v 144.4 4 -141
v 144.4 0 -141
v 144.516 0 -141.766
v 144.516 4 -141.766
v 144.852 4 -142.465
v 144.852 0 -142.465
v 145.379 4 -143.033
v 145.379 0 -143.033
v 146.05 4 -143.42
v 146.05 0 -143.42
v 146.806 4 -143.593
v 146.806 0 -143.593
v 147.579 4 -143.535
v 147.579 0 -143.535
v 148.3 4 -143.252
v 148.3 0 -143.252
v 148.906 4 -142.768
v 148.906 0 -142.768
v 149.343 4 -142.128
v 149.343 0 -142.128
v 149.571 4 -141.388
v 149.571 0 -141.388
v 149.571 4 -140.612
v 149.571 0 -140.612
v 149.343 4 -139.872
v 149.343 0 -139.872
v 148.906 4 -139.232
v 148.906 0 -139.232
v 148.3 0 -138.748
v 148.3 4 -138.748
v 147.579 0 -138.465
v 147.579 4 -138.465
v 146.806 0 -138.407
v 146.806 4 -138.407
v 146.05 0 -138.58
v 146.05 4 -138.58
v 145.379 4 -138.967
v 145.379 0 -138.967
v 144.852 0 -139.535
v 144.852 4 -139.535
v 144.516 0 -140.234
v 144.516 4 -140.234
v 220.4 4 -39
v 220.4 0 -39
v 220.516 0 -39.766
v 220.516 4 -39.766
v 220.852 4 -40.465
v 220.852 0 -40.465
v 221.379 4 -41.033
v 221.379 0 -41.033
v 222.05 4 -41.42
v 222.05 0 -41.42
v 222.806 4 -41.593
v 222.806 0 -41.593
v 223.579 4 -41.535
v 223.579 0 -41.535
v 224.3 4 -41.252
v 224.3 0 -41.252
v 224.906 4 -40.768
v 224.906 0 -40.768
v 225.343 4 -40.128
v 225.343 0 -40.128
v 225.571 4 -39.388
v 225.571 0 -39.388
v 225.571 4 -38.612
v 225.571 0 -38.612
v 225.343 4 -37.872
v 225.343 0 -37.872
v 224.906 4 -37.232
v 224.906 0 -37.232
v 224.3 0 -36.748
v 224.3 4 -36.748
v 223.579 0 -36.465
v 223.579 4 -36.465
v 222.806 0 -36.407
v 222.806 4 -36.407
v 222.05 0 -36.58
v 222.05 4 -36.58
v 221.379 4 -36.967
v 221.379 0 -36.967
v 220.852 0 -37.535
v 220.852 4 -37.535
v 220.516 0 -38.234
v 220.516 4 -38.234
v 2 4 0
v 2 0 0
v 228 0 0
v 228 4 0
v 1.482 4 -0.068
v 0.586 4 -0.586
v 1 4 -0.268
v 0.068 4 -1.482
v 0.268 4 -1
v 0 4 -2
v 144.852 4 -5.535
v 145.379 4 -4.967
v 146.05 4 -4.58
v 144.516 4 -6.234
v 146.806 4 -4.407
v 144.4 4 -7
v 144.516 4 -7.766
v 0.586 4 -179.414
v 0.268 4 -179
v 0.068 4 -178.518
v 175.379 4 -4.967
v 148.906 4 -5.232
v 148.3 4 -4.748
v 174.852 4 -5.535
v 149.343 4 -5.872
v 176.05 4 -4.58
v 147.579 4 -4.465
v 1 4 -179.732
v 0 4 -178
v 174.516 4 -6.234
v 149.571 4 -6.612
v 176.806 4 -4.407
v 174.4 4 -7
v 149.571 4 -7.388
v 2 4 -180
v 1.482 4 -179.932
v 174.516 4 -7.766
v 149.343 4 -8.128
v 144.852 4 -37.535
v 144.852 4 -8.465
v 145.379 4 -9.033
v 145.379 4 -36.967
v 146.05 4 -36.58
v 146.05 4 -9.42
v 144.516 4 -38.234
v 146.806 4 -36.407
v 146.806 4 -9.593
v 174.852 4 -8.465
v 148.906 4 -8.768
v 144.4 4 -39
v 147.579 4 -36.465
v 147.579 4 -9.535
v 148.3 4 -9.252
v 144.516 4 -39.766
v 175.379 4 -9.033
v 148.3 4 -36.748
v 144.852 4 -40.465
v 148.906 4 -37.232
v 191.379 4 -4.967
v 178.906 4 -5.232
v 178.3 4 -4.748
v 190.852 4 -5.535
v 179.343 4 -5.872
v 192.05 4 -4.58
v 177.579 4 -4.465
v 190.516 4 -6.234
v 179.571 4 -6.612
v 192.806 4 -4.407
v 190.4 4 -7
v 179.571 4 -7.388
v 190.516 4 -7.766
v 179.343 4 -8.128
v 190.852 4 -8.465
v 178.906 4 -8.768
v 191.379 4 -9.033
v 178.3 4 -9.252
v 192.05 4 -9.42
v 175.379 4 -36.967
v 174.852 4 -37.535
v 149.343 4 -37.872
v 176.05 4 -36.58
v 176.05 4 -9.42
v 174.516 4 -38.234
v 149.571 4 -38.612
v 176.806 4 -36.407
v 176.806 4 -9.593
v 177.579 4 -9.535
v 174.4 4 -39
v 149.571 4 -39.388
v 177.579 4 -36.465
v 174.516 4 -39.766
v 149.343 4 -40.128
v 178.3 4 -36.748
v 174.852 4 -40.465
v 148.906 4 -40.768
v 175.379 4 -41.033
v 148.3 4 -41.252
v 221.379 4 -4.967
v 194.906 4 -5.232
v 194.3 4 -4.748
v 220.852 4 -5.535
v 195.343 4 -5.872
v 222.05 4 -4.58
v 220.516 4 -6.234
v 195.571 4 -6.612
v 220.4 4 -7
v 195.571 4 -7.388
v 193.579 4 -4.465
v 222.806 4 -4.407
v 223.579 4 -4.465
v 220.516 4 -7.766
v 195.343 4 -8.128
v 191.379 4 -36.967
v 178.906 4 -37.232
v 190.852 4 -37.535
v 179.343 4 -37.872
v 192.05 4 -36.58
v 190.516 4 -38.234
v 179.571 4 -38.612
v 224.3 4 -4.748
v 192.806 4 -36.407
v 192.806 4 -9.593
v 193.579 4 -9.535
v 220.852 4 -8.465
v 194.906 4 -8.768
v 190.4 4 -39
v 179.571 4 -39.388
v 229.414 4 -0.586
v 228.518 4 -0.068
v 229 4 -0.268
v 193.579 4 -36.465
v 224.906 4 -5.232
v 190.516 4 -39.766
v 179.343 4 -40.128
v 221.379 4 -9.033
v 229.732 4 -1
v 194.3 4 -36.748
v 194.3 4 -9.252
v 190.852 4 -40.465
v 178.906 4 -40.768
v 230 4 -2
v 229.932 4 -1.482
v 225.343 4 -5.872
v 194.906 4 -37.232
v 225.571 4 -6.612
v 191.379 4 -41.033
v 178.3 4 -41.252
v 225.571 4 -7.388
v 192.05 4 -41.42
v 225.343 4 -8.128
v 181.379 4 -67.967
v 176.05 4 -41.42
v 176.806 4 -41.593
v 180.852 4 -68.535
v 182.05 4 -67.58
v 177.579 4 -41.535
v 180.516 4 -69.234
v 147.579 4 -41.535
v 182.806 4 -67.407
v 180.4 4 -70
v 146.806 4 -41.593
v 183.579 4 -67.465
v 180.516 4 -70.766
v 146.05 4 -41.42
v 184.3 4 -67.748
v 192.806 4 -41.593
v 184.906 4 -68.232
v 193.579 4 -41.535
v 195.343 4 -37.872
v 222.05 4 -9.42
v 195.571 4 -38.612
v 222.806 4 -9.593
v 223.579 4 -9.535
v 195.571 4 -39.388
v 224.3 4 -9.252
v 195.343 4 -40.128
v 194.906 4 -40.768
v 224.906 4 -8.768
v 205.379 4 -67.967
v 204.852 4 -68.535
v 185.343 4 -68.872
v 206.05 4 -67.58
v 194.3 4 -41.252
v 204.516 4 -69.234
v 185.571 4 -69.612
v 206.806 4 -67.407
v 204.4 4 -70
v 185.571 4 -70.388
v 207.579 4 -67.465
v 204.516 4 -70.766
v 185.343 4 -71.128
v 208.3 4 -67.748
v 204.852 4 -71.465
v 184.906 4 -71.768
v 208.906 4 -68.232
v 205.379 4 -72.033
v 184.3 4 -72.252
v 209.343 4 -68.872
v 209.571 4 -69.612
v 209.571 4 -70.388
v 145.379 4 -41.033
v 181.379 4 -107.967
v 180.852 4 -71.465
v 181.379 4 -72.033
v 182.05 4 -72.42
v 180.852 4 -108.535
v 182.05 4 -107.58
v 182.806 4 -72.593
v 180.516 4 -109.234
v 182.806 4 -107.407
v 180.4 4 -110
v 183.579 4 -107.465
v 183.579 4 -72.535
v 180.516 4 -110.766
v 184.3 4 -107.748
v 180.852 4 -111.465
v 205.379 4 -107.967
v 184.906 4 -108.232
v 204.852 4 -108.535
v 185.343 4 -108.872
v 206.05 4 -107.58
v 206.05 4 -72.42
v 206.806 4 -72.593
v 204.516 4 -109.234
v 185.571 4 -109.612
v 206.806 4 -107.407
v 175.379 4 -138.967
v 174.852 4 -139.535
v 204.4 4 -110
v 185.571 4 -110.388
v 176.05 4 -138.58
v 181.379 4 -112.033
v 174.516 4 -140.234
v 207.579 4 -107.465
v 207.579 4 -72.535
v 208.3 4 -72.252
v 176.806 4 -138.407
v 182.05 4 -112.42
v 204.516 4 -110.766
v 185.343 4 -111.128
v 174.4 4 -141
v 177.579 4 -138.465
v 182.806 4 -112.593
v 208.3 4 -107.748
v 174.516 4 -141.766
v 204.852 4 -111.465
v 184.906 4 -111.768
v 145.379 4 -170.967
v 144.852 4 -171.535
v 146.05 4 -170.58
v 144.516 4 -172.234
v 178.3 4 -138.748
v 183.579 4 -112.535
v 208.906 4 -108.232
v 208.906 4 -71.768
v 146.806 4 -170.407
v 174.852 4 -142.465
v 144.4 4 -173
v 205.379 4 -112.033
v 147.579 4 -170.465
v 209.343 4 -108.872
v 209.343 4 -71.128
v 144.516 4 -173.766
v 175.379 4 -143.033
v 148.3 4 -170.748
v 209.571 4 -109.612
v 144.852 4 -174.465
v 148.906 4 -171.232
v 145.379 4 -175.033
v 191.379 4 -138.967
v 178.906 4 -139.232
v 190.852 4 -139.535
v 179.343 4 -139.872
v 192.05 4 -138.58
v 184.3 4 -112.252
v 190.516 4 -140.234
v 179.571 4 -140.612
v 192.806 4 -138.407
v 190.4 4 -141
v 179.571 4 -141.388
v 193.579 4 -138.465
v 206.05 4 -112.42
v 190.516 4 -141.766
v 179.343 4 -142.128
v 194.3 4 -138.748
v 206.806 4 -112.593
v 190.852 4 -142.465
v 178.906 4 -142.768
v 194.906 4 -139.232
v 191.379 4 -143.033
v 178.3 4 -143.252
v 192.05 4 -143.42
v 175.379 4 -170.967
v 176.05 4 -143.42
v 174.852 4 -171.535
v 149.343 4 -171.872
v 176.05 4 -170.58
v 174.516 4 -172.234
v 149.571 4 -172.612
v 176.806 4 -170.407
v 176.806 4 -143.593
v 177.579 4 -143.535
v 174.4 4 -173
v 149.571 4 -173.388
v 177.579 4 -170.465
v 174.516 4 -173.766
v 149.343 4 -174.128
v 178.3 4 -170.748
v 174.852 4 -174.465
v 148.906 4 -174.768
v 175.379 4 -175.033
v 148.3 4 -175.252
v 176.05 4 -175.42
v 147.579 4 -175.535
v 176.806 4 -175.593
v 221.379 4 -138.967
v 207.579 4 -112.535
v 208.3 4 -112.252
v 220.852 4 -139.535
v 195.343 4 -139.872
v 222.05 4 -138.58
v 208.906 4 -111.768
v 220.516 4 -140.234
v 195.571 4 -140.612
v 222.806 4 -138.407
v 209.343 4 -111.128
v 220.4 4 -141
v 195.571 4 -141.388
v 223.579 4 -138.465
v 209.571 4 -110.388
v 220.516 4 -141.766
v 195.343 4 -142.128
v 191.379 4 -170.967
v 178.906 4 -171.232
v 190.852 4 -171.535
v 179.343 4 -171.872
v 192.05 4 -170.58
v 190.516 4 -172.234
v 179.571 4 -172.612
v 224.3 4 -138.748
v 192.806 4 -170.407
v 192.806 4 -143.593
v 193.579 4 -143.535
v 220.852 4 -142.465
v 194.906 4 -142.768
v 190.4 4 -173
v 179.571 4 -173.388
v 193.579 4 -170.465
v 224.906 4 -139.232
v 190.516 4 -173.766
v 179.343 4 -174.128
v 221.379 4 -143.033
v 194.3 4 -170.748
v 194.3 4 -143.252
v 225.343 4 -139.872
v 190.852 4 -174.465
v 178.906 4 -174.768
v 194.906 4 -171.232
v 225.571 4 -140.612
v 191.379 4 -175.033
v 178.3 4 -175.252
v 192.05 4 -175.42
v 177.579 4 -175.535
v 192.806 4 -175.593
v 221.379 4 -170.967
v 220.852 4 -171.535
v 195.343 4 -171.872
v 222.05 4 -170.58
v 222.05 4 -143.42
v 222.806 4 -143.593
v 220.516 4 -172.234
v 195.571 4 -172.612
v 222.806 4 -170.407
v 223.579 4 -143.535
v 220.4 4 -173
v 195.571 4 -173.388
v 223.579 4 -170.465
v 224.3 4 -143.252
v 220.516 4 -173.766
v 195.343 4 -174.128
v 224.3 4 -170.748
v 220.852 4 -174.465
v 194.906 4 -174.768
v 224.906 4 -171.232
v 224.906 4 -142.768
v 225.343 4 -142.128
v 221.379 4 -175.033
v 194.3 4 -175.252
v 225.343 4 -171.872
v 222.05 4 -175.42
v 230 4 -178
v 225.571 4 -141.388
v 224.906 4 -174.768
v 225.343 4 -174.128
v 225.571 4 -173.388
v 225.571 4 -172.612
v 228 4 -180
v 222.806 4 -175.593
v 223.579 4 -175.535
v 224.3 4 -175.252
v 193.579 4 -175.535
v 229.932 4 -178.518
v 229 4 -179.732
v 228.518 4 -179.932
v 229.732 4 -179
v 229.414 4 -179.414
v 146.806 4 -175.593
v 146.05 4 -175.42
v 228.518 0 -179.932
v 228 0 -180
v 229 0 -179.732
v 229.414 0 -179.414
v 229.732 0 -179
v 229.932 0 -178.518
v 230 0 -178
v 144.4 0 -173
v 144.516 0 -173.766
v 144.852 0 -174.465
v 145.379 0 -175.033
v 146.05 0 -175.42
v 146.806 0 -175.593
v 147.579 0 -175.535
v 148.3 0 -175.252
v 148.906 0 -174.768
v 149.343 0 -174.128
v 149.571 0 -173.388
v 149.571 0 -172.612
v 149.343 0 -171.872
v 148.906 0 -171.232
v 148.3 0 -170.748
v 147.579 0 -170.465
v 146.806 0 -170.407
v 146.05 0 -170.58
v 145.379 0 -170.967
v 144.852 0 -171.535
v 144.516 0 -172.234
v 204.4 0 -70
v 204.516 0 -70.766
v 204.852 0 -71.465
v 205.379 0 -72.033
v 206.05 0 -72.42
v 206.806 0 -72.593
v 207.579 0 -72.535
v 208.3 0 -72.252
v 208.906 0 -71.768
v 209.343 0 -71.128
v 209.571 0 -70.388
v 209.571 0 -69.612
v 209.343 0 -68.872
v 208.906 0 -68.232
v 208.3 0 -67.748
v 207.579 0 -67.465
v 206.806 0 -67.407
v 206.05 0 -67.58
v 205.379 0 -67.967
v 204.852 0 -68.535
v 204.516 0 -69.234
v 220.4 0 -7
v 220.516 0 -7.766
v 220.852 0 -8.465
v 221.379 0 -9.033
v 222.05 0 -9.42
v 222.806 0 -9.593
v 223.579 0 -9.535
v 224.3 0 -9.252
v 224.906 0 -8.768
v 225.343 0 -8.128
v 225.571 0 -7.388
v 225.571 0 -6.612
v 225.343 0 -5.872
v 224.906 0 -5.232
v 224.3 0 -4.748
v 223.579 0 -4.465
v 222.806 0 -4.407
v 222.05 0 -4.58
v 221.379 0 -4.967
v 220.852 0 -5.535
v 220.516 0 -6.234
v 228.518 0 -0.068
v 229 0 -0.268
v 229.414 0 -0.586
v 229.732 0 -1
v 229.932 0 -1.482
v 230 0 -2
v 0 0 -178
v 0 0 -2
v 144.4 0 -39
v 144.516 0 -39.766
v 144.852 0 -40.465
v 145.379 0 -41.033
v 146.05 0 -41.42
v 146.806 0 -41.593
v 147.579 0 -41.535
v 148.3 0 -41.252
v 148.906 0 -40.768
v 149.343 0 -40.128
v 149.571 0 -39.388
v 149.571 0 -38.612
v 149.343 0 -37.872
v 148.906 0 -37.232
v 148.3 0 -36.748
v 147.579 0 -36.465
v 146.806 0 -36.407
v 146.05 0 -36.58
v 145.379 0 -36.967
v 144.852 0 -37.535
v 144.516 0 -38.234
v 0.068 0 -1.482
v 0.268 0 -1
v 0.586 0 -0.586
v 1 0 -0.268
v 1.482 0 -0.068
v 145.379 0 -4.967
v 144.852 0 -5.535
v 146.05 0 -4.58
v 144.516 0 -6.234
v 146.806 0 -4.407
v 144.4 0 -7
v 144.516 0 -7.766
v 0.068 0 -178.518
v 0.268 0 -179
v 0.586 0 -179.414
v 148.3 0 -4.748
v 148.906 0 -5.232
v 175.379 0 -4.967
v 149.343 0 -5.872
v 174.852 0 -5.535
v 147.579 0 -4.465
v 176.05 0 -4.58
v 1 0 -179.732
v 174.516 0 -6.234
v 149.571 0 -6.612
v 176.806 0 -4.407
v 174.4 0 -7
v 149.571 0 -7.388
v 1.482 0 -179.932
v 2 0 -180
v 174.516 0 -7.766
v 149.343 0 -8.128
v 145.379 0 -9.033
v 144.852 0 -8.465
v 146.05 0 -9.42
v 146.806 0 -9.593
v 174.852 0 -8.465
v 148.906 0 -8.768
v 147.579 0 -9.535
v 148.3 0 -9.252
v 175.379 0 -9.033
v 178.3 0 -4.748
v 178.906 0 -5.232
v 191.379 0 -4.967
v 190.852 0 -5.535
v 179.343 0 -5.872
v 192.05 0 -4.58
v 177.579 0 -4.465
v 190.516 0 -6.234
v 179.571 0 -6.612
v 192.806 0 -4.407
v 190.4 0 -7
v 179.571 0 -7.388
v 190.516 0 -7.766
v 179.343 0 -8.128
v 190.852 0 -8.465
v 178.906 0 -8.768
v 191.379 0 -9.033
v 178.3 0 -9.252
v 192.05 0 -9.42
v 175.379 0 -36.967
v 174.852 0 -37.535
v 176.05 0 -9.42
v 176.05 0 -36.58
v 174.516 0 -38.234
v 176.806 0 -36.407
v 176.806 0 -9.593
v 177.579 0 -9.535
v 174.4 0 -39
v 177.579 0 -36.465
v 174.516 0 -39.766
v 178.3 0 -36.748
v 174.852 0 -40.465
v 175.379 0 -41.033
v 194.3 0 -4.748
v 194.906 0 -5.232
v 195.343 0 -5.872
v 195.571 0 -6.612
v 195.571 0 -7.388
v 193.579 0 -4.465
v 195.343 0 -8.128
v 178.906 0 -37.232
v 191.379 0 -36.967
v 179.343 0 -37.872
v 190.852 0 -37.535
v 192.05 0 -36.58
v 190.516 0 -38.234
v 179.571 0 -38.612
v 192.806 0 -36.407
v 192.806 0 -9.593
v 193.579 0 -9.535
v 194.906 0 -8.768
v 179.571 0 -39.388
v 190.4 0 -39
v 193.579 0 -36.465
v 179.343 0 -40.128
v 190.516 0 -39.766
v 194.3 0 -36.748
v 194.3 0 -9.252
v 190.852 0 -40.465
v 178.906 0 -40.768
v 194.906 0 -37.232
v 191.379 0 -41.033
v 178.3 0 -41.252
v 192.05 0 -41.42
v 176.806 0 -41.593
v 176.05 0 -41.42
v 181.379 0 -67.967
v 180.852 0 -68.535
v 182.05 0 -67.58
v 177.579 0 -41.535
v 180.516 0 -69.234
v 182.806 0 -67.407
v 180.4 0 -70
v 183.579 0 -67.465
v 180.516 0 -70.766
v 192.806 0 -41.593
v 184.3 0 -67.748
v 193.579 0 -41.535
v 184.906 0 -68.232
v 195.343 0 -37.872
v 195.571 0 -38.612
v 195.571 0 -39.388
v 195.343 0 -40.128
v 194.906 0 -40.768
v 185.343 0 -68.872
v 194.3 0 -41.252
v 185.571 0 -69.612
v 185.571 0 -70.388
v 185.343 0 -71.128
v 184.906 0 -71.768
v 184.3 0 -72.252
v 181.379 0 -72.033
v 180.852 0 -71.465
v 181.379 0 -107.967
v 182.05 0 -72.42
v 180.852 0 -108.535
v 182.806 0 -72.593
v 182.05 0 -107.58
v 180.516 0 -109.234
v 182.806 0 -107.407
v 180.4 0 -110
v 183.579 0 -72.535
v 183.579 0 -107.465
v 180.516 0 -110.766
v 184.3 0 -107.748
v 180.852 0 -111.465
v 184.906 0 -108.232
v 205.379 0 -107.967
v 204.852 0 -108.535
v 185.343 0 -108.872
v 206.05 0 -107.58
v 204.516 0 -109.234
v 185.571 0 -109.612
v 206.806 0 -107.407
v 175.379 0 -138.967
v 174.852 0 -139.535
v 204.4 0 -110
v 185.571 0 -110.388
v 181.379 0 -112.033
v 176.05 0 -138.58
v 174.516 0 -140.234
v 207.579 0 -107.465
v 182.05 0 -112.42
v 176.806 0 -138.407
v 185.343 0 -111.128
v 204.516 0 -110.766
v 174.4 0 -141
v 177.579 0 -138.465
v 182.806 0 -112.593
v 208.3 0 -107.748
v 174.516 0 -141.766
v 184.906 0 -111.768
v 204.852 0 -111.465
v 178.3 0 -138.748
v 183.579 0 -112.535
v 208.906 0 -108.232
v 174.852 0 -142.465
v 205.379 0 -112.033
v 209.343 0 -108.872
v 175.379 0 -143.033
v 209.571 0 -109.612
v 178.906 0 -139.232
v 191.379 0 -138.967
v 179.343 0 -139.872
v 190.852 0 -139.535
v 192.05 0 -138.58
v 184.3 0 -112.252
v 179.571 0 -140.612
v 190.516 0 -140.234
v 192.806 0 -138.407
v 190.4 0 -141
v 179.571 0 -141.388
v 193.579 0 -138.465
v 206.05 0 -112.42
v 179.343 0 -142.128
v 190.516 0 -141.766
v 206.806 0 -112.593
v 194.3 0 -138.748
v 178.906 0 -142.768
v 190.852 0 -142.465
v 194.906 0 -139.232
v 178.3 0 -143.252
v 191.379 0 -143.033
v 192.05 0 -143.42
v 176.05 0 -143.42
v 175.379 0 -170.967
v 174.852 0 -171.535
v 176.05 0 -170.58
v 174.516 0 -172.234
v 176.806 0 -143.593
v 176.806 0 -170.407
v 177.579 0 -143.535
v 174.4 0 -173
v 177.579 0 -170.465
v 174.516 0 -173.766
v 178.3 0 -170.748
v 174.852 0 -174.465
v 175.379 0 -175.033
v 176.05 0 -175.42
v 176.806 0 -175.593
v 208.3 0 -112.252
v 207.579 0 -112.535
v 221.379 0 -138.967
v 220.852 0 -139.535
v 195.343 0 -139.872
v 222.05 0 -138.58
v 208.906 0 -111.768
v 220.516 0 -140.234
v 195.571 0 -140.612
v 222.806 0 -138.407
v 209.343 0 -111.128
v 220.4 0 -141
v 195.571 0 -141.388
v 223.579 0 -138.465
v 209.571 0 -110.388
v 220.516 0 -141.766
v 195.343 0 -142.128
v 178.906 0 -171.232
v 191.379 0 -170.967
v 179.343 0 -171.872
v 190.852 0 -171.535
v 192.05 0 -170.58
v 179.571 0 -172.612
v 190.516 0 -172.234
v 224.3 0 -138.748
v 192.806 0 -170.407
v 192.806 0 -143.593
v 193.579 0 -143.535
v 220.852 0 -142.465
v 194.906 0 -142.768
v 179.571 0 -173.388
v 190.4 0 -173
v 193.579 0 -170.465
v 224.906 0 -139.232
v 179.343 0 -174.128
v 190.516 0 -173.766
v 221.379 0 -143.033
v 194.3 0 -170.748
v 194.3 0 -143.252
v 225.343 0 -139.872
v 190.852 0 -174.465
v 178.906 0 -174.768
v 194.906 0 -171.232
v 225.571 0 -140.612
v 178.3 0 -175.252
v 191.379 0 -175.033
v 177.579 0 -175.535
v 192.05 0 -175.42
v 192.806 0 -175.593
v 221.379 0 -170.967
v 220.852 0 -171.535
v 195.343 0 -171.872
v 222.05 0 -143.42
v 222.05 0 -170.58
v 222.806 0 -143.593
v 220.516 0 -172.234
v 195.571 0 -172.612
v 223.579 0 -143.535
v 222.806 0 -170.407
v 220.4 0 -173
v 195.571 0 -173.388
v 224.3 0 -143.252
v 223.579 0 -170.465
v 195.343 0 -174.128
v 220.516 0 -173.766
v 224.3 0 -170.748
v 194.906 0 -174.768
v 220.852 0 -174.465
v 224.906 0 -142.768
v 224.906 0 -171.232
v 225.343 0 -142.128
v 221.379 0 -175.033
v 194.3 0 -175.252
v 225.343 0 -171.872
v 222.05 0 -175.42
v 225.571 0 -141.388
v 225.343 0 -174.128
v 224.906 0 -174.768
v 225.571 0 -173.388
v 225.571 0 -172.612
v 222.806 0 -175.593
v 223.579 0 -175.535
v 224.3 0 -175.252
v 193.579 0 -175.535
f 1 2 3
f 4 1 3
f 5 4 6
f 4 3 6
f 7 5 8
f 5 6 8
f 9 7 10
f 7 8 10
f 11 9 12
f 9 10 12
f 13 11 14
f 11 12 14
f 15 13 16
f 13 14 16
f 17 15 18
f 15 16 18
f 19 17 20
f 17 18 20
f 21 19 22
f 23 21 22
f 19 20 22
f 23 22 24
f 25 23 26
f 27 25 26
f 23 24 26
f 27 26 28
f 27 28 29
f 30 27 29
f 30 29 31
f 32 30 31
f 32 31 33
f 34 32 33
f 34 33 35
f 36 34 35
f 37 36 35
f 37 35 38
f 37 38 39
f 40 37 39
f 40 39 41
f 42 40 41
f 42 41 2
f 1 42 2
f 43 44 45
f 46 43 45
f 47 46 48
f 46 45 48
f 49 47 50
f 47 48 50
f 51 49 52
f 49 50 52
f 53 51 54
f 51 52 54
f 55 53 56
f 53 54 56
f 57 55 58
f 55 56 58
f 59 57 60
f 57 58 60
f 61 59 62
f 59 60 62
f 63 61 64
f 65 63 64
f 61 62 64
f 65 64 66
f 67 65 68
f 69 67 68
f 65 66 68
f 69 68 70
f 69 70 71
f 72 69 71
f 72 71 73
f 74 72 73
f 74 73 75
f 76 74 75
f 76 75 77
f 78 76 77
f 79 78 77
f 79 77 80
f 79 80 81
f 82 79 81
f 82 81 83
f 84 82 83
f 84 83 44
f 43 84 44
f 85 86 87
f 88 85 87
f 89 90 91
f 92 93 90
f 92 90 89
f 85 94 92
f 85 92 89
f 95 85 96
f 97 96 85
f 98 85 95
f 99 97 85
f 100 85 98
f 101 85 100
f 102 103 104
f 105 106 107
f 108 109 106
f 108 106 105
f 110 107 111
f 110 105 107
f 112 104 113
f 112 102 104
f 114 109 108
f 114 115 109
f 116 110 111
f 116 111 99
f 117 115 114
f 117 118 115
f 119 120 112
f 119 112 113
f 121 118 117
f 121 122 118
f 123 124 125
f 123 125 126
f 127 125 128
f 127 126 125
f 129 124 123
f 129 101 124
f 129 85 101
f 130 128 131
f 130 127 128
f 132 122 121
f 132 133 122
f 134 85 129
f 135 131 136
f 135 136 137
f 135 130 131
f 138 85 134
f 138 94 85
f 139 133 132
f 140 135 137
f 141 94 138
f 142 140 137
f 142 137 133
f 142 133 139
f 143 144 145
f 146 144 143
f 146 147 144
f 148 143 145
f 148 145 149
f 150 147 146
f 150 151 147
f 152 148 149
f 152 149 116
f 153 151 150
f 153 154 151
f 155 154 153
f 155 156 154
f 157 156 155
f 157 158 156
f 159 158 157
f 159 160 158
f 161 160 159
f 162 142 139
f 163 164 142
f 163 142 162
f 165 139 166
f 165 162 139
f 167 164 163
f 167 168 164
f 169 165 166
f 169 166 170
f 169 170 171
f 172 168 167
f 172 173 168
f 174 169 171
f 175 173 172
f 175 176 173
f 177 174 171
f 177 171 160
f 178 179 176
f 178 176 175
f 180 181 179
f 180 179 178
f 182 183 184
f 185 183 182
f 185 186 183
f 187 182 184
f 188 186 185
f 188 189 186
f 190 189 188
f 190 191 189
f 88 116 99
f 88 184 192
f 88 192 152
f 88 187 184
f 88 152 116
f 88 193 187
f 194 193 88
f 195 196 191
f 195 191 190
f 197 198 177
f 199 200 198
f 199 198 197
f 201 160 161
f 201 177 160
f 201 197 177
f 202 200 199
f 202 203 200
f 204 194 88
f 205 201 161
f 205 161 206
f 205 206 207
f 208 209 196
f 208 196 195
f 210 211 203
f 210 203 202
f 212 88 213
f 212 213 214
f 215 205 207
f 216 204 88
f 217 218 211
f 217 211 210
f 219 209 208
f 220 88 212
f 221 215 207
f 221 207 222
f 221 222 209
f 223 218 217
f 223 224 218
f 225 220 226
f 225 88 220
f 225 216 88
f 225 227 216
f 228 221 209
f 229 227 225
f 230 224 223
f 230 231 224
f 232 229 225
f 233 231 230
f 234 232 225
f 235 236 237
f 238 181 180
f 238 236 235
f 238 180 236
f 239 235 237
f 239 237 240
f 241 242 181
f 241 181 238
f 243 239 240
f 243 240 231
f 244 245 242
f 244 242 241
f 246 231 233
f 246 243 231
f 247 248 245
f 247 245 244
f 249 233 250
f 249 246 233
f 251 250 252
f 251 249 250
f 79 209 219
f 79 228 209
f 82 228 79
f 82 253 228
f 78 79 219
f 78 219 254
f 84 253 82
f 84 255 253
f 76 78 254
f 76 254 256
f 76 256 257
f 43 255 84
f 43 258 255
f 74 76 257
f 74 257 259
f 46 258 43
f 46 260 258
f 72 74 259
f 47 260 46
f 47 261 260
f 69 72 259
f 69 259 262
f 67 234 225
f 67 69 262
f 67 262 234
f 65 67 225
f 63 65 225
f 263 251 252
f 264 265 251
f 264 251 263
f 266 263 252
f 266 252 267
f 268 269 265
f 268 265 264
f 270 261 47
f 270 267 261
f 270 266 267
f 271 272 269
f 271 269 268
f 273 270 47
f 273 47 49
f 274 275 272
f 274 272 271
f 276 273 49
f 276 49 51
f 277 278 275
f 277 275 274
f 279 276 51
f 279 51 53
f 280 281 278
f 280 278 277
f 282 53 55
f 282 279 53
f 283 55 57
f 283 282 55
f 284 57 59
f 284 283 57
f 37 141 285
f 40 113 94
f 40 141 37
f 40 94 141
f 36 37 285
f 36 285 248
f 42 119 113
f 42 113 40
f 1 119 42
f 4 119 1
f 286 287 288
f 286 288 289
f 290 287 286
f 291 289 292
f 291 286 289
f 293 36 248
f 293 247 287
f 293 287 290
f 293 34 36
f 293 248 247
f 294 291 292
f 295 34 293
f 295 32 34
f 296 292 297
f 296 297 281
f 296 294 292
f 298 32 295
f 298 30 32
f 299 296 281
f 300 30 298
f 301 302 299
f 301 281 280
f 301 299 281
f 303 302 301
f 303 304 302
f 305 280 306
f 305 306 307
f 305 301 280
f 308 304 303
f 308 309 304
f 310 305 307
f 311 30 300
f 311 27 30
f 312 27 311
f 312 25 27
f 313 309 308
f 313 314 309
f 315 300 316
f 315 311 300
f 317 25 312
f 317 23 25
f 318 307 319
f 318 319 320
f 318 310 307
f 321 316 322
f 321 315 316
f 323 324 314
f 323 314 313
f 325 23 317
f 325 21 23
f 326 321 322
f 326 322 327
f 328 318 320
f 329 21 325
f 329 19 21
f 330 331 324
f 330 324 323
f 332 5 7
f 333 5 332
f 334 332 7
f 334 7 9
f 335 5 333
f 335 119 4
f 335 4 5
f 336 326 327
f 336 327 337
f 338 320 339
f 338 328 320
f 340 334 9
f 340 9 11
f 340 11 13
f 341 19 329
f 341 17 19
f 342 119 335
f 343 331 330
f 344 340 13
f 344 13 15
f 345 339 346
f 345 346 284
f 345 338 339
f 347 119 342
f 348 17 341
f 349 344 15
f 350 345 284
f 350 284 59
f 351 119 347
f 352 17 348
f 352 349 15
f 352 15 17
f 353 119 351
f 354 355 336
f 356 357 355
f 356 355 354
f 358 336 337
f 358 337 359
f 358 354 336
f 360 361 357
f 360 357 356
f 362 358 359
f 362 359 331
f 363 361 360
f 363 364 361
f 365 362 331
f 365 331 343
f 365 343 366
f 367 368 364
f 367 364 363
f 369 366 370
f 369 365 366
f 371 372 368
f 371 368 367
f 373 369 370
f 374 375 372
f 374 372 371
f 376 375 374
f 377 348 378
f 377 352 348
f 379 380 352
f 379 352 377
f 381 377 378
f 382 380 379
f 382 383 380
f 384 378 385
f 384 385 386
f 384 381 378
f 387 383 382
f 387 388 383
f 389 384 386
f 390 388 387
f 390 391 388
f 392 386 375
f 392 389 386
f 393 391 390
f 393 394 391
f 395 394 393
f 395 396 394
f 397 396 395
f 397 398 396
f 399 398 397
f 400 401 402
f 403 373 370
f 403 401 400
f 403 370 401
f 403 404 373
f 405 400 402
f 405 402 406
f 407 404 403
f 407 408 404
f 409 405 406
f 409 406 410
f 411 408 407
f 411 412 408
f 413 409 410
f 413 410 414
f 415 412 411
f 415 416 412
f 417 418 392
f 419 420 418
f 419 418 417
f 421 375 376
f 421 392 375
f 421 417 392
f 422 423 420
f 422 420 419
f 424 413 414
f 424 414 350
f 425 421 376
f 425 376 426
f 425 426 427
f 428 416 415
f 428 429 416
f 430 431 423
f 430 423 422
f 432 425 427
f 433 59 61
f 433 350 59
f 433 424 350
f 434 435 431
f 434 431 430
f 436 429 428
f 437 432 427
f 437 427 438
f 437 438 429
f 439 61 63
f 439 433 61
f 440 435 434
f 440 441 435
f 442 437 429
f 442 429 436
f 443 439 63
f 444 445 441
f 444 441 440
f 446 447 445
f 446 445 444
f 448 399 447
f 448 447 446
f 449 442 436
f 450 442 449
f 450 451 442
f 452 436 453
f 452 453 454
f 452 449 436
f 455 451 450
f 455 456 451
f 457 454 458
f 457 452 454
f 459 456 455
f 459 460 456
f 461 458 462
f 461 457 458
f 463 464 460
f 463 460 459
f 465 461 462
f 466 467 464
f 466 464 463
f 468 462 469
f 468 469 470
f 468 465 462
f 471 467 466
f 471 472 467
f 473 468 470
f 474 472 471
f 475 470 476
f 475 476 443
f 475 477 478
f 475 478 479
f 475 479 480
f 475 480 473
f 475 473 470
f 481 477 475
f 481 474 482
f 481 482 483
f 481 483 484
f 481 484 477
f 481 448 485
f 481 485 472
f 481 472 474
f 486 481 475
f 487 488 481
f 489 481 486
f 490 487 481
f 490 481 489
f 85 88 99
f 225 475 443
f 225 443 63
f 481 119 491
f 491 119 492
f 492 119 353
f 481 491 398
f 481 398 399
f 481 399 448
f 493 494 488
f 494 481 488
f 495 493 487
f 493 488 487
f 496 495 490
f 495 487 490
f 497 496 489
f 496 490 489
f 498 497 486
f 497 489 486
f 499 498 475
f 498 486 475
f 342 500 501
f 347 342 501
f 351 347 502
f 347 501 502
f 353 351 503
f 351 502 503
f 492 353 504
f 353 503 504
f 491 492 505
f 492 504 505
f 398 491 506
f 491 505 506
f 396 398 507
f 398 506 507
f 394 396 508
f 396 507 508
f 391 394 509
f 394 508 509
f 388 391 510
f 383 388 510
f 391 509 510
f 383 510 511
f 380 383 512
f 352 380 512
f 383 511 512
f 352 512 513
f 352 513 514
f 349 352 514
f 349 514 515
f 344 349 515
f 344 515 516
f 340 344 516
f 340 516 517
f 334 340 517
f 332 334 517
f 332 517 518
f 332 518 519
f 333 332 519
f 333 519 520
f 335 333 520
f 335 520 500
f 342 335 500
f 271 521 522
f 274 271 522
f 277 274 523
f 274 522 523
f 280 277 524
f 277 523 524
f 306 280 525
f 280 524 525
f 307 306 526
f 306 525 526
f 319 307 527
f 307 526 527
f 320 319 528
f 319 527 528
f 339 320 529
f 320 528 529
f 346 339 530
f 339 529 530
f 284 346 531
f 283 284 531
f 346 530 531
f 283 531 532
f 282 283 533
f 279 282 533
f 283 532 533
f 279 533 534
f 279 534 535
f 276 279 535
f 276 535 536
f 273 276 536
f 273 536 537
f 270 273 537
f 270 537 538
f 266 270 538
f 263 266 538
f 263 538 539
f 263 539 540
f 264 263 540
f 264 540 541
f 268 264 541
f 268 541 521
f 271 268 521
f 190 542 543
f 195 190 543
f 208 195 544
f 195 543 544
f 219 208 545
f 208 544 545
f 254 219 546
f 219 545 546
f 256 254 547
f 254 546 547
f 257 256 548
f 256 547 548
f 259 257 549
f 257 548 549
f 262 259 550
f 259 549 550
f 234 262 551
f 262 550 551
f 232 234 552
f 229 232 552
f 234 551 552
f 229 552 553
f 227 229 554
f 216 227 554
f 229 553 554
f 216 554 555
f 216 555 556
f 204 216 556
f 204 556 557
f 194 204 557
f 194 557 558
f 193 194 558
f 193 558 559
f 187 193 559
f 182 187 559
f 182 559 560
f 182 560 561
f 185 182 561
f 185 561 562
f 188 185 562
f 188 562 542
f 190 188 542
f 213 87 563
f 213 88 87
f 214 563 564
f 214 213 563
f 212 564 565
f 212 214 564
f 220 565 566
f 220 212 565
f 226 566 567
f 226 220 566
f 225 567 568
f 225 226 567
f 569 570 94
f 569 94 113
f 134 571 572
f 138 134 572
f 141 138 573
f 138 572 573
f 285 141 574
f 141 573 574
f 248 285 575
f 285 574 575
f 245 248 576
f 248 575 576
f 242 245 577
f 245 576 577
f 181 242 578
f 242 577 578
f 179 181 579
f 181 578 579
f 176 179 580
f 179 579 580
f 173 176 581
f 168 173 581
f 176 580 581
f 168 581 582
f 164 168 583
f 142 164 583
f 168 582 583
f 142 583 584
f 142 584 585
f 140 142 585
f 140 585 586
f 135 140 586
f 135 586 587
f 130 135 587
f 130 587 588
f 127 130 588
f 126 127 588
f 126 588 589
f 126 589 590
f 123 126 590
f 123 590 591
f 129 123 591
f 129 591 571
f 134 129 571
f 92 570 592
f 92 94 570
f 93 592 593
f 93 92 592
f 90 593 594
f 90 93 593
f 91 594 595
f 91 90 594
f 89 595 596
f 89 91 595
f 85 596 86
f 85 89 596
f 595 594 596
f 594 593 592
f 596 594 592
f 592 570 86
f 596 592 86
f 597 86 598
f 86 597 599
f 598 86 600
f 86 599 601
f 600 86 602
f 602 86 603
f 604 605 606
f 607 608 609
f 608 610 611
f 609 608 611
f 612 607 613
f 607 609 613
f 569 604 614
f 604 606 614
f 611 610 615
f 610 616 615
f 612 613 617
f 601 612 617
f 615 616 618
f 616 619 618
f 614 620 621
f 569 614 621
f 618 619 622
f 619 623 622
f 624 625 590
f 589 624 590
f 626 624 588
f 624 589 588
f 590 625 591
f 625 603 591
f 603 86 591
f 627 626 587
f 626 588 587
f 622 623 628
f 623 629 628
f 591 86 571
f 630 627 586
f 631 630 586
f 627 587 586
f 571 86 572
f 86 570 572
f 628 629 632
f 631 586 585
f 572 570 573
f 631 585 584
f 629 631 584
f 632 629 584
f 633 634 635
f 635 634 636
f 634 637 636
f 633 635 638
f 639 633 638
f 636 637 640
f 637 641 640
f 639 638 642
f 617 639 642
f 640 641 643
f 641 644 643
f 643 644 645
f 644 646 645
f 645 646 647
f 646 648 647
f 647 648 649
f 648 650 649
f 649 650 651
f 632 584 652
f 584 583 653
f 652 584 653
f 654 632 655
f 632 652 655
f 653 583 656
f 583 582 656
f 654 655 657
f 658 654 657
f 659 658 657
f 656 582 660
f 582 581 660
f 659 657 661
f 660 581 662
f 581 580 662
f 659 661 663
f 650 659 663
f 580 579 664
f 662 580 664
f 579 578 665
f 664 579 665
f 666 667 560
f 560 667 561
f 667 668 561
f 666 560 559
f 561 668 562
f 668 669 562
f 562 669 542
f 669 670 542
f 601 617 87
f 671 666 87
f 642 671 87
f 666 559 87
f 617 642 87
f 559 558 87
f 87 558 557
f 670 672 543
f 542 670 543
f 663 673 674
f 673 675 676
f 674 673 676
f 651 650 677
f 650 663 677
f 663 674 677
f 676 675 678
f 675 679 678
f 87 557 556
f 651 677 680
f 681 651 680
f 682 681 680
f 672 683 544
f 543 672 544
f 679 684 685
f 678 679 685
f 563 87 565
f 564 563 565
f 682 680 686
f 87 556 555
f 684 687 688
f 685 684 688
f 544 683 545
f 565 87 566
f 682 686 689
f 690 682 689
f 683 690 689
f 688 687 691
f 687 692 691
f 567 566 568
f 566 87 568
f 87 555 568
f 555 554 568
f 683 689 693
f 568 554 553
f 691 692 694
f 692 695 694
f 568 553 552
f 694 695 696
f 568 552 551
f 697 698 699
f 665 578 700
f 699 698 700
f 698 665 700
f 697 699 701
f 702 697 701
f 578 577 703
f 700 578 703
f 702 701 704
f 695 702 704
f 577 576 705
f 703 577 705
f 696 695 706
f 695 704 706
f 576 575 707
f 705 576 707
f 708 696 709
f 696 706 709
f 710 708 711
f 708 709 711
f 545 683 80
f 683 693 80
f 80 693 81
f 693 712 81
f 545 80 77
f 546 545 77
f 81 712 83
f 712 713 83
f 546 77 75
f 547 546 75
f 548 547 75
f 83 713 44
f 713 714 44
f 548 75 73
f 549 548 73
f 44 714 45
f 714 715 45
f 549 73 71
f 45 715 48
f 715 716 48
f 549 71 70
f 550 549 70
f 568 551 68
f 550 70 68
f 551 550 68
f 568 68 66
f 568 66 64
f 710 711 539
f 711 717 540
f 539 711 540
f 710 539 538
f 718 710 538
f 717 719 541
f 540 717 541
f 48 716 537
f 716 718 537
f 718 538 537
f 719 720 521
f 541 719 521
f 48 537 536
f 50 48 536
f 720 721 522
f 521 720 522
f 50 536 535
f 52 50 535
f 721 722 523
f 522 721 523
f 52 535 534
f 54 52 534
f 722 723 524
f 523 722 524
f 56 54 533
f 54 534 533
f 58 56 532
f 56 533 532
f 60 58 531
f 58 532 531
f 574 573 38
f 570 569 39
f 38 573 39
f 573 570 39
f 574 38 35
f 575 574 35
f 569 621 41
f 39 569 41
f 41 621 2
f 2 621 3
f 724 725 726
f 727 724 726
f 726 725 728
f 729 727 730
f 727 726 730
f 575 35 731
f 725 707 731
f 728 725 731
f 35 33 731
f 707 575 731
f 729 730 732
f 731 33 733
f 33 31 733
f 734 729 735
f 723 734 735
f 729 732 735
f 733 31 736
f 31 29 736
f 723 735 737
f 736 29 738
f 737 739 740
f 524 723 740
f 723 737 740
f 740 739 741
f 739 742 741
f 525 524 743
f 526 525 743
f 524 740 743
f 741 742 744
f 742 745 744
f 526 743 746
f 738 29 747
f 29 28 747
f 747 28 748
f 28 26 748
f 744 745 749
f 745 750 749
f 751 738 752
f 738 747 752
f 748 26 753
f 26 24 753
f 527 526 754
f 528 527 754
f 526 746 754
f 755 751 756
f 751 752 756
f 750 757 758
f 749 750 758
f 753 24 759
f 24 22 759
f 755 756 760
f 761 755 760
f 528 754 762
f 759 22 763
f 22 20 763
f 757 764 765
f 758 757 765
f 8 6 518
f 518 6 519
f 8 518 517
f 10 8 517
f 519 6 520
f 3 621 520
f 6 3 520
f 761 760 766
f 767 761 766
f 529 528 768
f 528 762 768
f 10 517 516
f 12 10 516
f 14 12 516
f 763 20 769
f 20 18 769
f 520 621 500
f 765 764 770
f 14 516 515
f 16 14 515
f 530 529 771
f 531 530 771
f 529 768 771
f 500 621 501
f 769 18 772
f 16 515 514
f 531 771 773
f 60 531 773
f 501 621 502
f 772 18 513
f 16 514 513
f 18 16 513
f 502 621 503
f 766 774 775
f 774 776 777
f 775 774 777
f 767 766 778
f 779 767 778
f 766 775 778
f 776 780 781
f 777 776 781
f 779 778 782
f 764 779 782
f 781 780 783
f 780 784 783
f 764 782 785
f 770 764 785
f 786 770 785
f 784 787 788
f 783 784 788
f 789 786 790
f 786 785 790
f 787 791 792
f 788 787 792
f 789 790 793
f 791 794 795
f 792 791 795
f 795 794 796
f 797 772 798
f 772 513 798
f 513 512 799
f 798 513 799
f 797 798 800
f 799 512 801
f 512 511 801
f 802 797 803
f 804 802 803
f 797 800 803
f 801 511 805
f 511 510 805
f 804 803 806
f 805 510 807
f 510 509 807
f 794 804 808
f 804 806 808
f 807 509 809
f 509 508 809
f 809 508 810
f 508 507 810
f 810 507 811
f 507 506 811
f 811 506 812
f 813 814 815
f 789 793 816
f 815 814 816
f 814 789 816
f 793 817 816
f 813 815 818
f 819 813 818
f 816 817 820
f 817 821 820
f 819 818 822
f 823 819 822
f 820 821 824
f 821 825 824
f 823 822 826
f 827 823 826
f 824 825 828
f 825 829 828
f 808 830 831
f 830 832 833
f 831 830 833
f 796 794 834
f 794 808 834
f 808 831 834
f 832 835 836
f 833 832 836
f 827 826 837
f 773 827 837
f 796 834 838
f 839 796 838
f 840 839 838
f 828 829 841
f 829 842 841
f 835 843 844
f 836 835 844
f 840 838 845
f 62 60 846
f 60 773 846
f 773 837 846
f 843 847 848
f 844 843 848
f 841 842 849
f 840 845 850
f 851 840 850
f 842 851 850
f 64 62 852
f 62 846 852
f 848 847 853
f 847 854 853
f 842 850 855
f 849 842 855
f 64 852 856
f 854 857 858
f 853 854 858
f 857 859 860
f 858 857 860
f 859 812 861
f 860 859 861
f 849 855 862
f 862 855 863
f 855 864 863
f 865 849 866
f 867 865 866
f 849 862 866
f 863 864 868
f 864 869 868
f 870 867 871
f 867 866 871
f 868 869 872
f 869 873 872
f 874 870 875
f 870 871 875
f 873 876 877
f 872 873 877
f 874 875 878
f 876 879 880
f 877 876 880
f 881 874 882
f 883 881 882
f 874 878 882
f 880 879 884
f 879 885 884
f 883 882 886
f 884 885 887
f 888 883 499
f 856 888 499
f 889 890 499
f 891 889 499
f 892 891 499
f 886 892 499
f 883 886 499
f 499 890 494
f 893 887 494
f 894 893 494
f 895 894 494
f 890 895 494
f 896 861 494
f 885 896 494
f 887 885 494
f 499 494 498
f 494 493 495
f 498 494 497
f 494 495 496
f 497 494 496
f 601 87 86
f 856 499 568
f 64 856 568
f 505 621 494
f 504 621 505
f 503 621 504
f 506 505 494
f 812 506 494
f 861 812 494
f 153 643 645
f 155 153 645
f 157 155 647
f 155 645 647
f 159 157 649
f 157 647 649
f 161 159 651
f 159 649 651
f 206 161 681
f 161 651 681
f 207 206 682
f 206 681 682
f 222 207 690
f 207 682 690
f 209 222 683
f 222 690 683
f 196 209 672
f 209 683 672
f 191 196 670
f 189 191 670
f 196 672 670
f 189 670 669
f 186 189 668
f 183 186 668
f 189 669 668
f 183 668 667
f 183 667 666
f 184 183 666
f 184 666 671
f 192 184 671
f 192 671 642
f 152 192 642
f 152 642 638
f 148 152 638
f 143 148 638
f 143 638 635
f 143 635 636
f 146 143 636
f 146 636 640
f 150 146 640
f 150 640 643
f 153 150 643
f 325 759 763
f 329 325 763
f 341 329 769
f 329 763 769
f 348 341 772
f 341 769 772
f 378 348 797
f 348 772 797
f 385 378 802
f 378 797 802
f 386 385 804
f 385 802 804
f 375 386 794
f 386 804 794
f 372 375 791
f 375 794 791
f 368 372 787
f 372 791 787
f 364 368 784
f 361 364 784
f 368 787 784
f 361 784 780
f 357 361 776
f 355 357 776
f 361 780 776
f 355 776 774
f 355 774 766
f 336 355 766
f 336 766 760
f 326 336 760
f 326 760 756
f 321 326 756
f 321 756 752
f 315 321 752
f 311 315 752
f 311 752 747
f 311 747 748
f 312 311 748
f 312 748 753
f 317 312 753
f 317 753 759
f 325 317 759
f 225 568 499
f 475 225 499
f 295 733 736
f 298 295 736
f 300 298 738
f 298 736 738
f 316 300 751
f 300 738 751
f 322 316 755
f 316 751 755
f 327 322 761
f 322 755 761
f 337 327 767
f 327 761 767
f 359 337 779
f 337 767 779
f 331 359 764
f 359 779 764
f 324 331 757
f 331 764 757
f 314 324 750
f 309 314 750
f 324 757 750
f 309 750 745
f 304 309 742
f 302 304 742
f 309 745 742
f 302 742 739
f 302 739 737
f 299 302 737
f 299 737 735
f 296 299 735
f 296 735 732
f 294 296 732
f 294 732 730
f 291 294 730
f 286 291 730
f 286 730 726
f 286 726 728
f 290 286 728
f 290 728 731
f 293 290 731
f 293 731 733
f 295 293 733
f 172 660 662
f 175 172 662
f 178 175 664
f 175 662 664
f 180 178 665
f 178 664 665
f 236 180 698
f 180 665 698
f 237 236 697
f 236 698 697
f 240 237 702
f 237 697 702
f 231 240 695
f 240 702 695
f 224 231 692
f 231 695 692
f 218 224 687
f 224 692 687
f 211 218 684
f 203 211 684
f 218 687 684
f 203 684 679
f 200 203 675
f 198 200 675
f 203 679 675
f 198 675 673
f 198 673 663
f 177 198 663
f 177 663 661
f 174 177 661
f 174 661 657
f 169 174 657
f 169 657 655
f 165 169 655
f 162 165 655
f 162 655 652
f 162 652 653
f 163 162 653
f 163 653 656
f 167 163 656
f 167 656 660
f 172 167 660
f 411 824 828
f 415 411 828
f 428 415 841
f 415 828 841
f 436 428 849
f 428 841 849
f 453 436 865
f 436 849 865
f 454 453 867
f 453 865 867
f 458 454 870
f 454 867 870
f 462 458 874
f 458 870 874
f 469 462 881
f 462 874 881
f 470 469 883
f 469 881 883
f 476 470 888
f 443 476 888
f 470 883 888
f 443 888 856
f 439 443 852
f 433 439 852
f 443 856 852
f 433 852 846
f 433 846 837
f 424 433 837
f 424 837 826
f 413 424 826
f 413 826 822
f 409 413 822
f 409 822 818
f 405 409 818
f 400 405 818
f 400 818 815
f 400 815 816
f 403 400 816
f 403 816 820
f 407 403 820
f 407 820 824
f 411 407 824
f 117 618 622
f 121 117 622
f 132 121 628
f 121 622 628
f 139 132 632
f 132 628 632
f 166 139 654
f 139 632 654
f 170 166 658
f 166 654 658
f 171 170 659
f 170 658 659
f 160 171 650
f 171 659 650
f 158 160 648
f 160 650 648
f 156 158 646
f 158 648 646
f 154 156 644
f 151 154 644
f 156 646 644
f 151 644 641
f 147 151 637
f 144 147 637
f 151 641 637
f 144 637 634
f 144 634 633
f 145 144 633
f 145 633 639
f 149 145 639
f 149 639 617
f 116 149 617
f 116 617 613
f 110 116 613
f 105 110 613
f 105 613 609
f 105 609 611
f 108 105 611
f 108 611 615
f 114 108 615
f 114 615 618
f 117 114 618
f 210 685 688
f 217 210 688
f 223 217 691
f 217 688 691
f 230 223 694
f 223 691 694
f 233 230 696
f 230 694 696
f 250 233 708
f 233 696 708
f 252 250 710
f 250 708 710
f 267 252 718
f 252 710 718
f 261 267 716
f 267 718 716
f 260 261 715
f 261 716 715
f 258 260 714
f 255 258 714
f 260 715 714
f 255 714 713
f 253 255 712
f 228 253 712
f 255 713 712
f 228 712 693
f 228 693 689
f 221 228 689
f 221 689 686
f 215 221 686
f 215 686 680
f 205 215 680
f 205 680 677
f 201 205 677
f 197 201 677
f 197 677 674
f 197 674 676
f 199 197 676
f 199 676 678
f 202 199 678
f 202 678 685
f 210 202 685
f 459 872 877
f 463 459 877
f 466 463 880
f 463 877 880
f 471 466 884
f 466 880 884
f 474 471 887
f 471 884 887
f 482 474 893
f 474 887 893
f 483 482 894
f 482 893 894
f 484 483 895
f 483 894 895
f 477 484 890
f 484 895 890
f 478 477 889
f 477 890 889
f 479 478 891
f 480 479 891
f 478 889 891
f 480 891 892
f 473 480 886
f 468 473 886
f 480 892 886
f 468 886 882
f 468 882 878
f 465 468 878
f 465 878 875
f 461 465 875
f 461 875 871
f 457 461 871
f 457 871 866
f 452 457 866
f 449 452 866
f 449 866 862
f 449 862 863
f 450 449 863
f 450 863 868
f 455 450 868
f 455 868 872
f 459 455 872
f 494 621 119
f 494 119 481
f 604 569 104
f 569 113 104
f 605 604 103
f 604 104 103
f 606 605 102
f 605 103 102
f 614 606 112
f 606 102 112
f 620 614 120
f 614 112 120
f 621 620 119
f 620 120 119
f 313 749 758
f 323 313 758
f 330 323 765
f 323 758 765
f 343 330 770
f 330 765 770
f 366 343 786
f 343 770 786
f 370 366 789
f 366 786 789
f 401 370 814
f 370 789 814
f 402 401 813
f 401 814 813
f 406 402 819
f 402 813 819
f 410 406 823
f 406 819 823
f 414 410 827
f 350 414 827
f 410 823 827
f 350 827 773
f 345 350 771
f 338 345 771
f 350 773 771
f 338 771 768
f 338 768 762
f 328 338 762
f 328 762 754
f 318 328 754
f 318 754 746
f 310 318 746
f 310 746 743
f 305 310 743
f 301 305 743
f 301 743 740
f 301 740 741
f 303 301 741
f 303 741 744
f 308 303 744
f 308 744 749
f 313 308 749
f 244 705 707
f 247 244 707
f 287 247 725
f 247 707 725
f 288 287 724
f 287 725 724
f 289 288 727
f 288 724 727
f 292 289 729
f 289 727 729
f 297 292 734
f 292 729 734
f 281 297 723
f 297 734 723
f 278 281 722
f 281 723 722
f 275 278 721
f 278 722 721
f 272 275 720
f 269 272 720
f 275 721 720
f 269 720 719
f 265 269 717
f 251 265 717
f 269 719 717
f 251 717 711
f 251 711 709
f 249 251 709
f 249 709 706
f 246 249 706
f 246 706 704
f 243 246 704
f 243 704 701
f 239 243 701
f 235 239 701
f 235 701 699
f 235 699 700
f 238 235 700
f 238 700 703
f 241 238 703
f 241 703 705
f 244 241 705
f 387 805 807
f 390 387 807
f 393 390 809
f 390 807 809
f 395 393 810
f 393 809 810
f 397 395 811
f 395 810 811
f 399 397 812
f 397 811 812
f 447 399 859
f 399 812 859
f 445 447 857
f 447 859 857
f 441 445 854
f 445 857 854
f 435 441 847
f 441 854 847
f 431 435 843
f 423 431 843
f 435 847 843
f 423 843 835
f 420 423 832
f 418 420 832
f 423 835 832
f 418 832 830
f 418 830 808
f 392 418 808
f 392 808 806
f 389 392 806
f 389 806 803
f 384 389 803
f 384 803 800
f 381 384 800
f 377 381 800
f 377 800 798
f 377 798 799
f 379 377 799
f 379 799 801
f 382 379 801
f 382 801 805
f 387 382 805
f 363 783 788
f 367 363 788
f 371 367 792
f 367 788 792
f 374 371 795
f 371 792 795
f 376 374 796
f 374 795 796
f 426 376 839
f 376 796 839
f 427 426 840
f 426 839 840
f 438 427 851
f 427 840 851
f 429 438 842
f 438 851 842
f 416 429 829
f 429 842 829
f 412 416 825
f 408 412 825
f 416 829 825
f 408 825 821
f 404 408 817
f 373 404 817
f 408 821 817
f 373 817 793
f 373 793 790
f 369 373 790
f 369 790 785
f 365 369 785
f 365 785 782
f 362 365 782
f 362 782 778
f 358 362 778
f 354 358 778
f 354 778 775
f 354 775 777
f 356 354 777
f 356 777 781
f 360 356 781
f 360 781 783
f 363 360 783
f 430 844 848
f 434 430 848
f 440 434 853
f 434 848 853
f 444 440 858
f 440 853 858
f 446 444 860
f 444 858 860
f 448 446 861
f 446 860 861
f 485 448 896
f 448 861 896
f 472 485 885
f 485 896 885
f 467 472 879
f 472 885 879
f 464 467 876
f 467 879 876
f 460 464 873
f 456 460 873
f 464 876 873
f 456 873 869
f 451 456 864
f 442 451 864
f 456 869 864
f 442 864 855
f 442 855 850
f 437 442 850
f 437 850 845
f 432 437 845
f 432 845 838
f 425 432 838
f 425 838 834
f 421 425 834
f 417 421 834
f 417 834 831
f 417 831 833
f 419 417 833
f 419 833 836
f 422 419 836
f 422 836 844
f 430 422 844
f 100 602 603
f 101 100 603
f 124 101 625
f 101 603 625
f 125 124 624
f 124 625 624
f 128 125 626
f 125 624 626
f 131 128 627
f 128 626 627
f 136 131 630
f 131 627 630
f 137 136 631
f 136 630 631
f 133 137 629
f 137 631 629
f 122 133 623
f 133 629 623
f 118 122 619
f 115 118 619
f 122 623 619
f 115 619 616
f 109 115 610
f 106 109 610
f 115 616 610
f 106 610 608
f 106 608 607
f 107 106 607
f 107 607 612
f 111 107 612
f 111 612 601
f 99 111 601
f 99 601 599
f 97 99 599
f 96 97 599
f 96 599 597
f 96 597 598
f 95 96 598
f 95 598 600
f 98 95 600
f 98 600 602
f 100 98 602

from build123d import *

# Parameters (mm, degrees)
SKETCH_1_W              = 230
SKETCH_1_H              = 180
EXTRUDE_1_DEPTH         = 4
HOLE_WIZARD_5_2_5_2_1_D = 5.2
FILLET_1_R              = 2


with BuildPart() as part:
    # Эскиз1 → Бобышка-Вытянуть1 (new body)
    with BuildSketch(Plane(origin=(0, 0, 0), x_dir=(1, 0, 0), z_dir=(0, 1, 0))):
        with Locations((115, 90)):
            Rectangle(SKETCH_1_W, SKETCH_1_H)
    extrude(amount=EXTRUDE_1_DEPTH)

    # Диаметр отверстия Ø5.2 (5.2)1 (through all)
    with Locations(Plane(origin=(0, 4, 0), x_dir=(1, 0, 0), z_dir=(0, 1, 0))):
        with Locations((183, 70), (183, 110), (207, 70), (207, 110), (223, 39), (223, 7), (193, 7), (193, 39), (147, 39), (177, 39), (147, 7), (177, 7), (193, 173), (223, 173), (223, 141), (193, 141), (177, 173), (147, 173), (177, 141), (147, 141)):
            Hole(HOLE_WIZARD_5_2_5_2_1_D / 2)

    # Скругление1
    fillet_1_edges = [part.edges().sort_by_distance(p)[0] for p in [
        (0, 2, -180),
        (230, 2, -180),
        (230, 2, 0),
        (0, 2, 0),
    ]]
    fillet(fillet_1_edges, radius=FILLET_1_R)


solid = part.part
